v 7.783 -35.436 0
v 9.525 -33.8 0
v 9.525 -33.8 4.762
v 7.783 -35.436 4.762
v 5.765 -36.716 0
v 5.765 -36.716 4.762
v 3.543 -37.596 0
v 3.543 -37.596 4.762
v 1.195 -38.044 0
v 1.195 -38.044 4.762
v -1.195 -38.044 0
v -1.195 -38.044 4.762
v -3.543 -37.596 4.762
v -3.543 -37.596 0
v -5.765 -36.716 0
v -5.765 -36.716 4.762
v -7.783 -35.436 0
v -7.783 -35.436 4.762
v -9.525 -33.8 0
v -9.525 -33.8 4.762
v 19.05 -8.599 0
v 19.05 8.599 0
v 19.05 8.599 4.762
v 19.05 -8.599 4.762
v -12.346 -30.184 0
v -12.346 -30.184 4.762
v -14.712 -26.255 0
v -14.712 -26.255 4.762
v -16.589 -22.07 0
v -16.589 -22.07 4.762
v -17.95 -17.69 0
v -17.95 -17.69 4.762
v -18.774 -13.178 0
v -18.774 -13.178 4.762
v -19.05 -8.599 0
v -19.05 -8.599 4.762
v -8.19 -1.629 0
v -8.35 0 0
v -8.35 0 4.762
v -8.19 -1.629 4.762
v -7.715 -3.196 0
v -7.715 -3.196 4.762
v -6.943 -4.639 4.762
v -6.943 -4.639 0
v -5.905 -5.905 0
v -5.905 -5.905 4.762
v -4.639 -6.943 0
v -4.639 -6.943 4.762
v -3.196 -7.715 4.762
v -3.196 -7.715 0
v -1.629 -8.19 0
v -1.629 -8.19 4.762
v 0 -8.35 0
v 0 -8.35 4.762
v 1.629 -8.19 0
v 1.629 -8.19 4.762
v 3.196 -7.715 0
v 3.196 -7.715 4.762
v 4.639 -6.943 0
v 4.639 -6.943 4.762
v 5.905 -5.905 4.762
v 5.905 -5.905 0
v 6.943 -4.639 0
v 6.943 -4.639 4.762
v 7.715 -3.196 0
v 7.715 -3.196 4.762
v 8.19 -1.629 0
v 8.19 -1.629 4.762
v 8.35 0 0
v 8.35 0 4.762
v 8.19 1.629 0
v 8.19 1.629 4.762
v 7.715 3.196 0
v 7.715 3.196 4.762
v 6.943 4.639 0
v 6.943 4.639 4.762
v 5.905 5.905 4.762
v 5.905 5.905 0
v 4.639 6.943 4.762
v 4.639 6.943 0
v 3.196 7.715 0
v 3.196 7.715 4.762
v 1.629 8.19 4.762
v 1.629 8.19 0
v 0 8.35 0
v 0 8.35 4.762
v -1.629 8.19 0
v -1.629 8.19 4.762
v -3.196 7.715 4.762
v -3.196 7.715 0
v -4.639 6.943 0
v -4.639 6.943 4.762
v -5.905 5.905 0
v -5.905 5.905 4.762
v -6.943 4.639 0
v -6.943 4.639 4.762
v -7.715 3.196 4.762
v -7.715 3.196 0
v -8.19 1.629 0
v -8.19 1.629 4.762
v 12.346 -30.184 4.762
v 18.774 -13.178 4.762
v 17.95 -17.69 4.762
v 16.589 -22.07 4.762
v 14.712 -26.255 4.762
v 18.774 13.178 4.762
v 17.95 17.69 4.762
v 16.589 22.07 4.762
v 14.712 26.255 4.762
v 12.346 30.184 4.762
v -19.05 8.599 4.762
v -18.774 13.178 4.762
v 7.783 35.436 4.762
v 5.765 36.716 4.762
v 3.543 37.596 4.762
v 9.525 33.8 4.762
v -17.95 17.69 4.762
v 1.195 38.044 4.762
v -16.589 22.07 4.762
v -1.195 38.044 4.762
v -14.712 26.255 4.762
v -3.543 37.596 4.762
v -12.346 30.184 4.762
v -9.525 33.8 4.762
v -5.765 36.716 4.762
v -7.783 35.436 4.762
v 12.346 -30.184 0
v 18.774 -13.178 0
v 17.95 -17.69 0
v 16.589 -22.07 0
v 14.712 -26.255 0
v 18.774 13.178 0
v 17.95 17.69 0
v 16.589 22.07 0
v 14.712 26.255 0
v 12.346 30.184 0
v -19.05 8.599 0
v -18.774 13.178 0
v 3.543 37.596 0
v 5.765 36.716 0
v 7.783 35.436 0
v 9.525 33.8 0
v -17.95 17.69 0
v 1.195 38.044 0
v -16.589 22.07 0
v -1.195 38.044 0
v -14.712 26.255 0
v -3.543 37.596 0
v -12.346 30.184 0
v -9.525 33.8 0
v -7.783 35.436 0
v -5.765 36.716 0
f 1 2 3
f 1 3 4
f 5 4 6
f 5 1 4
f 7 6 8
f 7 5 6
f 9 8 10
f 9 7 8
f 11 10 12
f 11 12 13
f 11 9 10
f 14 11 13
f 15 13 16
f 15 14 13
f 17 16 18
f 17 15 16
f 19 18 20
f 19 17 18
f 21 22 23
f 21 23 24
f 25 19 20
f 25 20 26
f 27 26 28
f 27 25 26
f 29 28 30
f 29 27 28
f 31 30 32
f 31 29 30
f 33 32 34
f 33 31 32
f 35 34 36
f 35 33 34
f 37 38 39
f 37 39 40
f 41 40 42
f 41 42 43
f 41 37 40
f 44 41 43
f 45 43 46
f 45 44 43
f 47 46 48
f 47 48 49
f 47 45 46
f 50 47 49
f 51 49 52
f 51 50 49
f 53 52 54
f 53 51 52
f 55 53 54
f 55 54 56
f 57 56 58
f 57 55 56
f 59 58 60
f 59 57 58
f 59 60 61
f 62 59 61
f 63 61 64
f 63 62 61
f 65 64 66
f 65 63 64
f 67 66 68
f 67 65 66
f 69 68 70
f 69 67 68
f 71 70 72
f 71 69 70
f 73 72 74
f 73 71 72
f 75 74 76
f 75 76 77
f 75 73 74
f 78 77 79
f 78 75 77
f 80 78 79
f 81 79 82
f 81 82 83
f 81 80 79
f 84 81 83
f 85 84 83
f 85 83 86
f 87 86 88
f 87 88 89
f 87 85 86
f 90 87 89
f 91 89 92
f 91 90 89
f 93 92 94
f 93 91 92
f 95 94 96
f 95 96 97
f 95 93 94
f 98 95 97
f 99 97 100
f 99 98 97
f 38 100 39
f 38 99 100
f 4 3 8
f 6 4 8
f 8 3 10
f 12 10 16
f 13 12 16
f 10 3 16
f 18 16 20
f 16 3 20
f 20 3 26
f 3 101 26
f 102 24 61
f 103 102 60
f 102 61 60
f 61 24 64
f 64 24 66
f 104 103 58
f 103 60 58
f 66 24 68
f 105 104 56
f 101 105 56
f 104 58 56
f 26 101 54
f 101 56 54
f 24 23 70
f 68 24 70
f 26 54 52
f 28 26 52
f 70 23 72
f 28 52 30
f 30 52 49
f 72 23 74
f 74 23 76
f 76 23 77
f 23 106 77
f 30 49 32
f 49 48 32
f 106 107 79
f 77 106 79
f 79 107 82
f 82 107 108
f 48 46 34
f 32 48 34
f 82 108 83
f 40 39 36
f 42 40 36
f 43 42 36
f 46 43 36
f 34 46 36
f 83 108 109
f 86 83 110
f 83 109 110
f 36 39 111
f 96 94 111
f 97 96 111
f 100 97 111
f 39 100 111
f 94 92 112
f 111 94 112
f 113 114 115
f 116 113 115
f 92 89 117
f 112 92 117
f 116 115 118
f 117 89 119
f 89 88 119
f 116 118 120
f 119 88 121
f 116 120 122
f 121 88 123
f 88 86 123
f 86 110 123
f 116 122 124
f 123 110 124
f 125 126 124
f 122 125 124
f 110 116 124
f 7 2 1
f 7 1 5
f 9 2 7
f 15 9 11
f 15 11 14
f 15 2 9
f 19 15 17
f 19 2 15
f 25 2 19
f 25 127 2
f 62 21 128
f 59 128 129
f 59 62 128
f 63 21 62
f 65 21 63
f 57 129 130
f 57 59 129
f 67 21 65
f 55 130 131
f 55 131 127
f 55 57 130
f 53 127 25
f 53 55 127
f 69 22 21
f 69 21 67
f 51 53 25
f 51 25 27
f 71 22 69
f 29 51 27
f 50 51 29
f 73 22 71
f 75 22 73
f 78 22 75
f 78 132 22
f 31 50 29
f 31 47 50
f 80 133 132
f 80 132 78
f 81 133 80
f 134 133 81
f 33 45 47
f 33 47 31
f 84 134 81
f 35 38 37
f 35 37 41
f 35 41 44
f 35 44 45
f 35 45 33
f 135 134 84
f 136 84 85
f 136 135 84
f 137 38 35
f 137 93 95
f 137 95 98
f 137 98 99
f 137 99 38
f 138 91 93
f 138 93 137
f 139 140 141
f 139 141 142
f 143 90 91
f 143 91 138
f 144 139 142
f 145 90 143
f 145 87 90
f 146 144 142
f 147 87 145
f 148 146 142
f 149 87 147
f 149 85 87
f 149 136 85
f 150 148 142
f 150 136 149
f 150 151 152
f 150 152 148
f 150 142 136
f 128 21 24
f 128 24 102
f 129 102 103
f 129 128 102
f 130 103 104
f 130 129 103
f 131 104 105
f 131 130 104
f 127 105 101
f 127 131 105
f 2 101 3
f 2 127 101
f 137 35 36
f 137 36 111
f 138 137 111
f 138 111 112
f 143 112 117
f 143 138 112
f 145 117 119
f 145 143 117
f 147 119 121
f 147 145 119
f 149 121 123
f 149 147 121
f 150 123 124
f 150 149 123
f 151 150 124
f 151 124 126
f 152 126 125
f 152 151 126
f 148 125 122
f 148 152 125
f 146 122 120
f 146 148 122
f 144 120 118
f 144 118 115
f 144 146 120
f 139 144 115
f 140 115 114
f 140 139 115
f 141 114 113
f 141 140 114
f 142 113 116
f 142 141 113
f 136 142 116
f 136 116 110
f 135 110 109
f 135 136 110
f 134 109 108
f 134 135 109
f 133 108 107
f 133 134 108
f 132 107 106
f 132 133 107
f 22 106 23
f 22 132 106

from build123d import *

# Parameters (mm, degrees)
SKETCH1_R          = 8.35025
BASE_EXTRUDE_DEPTH = 4.7625


with BuildPart() as part:
    # Sketch1 → Base-Extrude (new body)
    with BuildSketch(Plane.XY):
        with BuildLine():
            Line((19.05, 8.599479175), (19.05, -8.599479175))
            ThreePointArc((19.05, -8.599479175), (16.589286609, -22.069863356), (9.525, -33.800260413))
            ThreePointArc((9.525, -33.800260413), (0, -38.1), (-9.525, -33.800260413))
            ThreePointArc((-9.525, -33.800260413), (-16.589286609, -22.069863356), (-19.05, -8.599479175))
            Line((-19.05, -8.599479175), (-19.05, 8.599479175))
            ThreePointArc((-19.05, 8.599479175), (-16.589286609, 22.069863356), (-9.525, 33.800260413))
            ThreePointArc((-9.525, 33.800260413), (0, 38.1), (9.525, 33.800260413))
            ThreePointArc((9.525, 33.800260413), (16.589286609, 22.069863356), (19.05, 8.599479175))
        make_face()
        with Locations(Location((0, 0, 0), (0, 0, 180))):
            Circle(SKETCH1_R, mode=Mode.SUBTRACT)
    extrude(amount=BASE_EXTRUDE_DEPTH)


solid = part.part
